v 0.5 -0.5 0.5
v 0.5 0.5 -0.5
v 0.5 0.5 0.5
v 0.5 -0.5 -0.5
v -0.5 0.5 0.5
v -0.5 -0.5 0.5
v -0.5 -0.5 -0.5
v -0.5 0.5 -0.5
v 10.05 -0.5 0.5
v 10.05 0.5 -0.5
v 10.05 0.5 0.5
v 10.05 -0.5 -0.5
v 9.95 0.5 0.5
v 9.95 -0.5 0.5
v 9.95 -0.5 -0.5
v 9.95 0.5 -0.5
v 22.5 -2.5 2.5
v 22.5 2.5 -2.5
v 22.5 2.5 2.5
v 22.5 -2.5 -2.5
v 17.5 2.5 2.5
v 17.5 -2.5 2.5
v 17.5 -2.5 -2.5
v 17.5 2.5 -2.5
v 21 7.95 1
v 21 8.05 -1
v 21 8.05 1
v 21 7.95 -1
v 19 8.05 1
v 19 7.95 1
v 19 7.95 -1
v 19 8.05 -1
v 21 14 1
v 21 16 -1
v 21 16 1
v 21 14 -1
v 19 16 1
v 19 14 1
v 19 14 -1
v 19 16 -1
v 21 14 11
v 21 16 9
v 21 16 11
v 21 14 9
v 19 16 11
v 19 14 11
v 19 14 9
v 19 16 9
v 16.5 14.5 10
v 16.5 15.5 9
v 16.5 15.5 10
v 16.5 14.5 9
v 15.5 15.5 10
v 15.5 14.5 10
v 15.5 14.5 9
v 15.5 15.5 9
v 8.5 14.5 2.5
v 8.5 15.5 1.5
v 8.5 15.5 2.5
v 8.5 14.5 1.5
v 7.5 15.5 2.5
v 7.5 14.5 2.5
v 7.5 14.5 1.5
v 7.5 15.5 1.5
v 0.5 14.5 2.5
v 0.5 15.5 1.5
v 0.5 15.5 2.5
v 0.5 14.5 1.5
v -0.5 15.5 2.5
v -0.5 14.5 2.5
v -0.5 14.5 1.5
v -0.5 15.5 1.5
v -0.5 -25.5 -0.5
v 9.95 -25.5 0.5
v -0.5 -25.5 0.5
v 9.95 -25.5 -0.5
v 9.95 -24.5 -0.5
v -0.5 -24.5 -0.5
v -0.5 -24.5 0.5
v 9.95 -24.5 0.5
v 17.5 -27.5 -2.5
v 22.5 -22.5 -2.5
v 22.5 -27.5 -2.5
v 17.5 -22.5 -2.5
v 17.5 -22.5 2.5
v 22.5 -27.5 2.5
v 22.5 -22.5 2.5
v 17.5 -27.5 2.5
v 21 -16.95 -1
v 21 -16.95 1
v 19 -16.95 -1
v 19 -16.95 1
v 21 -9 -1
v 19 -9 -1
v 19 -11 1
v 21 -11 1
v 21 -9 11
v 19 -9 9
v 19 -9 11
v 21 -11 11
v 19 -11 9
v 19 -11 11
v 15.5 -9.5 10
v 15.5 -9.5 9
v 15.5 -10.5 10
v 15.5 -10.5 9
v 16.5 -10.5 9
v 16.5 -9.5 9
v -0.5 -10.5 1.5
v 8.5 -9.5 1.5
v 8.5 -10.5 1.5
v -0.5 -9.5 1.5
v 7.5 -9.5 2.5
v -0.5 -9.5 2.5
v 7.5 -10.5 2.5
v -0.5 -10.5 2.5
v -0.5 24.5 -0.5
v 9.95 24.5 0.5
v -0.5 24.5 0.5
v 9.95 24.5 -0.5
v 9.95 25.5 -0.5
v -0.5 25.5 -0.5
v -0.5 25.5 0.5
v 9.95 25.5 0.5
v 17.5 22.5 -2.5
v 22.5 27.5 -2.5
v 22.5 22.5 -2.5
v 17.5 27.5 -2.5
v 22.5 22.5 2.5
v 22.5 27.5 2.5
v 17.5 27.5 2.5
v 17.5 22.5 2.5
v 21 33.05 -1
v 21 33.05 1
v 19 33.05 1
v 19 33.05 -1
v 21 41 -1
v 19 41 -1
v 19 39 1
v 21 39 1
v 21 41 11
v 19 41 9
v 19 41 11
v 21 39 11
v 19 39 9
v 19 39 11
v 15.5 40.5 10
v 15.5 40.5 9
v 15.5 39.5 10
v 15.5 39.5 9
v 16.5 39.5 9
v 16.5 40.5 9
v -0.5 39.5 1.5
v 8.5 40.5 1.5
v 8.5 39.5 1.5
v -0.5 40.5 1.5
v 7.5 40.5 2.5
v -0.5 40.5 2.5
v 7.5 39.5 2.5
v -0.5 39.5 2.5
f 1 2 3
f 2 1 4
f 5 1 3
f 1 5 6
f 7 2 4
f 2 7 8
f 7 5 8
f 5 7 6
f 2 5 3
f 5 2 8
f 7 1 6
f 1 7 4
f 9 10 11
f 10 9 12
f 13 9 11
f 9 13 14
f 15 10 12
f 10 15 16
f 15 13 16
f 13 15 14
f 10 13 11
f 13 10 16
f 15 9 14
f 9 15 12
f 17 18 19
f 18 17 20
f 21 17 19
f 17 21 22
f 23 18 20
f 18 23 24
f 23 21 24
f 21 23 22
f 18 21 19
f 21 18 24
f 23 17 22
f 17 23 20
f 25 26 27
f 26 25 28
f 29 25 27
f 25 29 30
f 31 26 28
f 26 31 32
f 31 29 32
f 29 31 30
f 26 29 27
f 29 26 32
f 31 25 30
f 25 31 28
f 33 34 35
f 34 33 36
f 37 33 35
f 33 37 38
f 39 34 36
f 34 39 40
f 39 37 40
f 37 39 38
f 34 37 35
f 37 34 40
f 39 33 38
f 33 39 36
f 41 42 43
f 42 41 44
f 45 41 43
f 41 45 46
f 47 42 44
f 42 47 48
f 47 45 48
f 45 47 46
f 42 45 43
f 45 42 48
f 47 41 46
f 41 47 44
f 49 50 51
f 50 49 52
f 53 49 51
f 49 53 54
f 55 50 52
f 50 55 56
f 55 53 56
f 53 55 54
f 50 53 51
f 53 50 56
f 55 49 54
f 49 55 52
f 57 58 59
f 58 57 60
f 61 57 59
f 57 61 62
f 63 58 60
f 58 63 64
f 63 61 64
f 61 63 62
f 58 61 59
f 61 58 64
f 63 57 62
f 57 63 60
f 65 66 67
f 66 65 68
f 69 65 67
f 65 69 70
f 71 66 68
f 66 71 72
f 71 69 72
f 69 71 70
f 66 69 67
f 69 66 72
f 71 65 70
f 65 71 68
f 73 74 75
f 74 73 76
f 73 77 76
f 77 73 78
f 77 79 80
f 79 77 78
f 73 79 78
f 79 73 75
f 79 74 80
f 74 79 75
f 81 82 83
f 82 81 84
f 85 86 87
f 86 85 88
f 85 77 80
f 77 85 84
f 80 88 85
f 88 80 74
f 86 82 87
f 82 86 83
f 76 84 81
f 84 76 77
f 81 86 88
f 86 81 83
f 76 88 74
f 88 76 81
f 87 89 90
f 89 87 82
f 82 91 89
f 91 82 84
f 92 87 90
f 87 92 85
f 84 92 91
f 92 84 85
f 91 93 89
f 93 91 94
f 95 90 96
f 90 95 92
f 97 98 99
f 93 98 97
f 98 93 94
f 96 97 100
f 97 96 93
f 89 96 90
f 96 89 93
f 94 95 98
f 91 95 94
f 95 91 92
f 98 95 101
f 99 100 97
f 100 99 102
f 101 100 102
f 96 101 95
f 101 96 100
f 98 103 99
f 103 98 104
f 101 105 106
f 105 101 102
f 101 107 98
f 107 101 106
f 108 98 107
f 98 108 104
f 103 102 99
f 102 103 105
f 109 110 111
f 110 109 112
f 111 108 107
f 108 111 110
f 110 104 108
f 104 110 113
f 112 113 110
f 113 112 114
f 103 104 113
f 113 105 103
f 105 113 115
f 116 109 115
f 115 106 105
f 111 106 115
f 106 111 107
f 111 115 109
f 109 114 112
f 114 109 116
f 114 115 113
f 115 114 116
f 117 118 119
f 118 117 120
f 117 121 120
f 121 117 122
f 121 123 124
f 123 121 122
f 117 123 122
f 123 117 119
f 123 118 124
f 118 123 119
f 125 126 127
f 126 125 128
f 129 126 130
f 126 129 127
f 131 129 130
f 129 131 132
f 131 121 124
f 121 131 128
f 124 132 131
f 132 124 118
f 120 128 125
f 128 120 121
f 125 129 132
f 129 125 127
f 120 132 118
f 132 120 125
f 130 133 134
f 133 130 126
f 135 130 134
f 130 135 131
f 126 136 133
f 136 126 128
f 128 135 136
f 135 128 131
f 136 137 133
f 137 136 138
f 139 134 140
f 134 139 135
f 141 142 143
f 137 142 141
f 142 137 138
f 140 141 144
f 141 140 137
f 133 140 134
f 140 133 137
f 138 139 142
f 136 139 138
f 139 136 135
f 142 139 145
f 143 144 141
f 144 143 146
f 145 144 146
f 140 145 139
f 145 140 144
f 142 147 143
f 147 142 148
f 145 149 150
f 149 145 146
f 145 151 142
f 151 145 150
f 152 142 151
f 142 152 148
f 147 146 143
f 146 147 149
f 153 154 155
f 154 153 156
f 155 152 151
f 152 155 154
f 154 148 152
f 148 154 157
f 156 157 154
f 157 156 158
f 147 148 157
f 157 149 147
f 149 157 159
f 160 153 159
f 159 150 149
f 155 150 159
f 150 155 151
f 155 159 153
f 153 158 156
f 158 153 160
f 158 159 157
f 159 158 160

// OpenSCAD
module shape3D(size, position, center=true) {
    translate(position) cube(size, center=center);
}

// See https://forum.openscad.org/Calculating-Summarize-Arrays-generate-Array-td29132.html
function partial_sum(v, n, r = 0) = n <= 0 
        ? r + v[0] 
        : partial_sum(v, n - 1, r + v[n]); 

function partial_sum_vectors(v, n, r = [0,0,0]) = partial_sum(v, n, r); 

/*
// Tests for partial_sum and partial_sum_vectors
dim = [10, 8, 2, 25, 5]; 
n = len(dim); 
x_pos = [for(i = [0:n-1]) partial_sum(dim, i)]; 
echo(x_pos); // ECHO: [10, 18, 20, 45, 50] 
echo("");
dim2 = [[10, 1], [8, 1], [2, 1], [25, 1], [5, 2]]; 
n2 = len(dim2); 
x_pos2 = [for(i = [0:n2-1]) partial_sum_vectors(dim2, i)]; 
echo(x_pos2); // ECHO: [[10, 1], [18, 2], [20, 3], [45, 4], [50, 6]]
echo("");
x_pos3 = [for(i = [0:n2-1]) partial_sum(dim2, i, [0,0,0])]; 
echo(x_pos3); // ECHO: [[10, 1], [18, 2], [20, 3], [45, 4], [50, 6]]
echo("");
*/

module polychannel_absolute_positions(sizes, positions, clr="lightblue", center=true, show_only_shapes=false) {
    if (show_only_shapes) {
        for (i = [0:len(sizes)-1]) {
            color(clr) shape3D(sizes[i], positions[i]);
        }
    } else {
        for (i = [1:len(sizes)-1]) {
            color(clr) hull() {
                shape3D(sizes[i-1], positions[i-1]);
                shape3D(sizes[i], positions[i]);
            };
        };
    }
}

module polychannel(sizes, positions=[], relative_positions=false, clr="lightblue", center=true, show_only_shapes=false) {
    if (relative_positions) {
        absolute_positions = [for(i = [0:len(sizes)-1]) partial_sum_vectors(positions, i)];
        polychannel_absolute_positions(sizes, absolute_positions, clr=clr, center=center, show_only_shapes=show_only_shapes);
    } else {
        polychannel_absolute_positions(sizes, positions, clr=clr, center=center, show_only_shapes=show_only_shapes);
    }
}


size1 = [1, 1, 1];

sizes = [
    size1,
    [0.1, 1, 1],
    5 * size1,
    [2, 0.1, 2],
    2 * size1,
    2 * size1,
    size1,
    size1,
    size1
];
positions = [
    [0, 0, 0],
    [10, 0, 0],
    [20, 0, 0],
    [20, 8, 0],
    [20, 15, 0],
    [20, 15, 10],
    [16, 15, 9.5],
    [8, 15, 2],
    [0, 15, 2]
];
relative_positions = [
    [0, 0, 0],  // All subsequent positions are relative to this position
    [10, 0, 0],
    [10, 0, 0],
    [0, 8, 0],
    [0, 7, 0],
    [0, 0, 10],
    [-4, 0, -0.5],
    [-8, 0, -7.5],
    [-8, 0, 0]
];

polychannel(sizes, positions, clr="red", show_only_shapes=true);

translate([0, -25, 0]) polychannel(sizes, positions, clr="Salmon");

translate([0, 25, 0]) polychannel(sizes, relative_positions, relative_positions=true);
